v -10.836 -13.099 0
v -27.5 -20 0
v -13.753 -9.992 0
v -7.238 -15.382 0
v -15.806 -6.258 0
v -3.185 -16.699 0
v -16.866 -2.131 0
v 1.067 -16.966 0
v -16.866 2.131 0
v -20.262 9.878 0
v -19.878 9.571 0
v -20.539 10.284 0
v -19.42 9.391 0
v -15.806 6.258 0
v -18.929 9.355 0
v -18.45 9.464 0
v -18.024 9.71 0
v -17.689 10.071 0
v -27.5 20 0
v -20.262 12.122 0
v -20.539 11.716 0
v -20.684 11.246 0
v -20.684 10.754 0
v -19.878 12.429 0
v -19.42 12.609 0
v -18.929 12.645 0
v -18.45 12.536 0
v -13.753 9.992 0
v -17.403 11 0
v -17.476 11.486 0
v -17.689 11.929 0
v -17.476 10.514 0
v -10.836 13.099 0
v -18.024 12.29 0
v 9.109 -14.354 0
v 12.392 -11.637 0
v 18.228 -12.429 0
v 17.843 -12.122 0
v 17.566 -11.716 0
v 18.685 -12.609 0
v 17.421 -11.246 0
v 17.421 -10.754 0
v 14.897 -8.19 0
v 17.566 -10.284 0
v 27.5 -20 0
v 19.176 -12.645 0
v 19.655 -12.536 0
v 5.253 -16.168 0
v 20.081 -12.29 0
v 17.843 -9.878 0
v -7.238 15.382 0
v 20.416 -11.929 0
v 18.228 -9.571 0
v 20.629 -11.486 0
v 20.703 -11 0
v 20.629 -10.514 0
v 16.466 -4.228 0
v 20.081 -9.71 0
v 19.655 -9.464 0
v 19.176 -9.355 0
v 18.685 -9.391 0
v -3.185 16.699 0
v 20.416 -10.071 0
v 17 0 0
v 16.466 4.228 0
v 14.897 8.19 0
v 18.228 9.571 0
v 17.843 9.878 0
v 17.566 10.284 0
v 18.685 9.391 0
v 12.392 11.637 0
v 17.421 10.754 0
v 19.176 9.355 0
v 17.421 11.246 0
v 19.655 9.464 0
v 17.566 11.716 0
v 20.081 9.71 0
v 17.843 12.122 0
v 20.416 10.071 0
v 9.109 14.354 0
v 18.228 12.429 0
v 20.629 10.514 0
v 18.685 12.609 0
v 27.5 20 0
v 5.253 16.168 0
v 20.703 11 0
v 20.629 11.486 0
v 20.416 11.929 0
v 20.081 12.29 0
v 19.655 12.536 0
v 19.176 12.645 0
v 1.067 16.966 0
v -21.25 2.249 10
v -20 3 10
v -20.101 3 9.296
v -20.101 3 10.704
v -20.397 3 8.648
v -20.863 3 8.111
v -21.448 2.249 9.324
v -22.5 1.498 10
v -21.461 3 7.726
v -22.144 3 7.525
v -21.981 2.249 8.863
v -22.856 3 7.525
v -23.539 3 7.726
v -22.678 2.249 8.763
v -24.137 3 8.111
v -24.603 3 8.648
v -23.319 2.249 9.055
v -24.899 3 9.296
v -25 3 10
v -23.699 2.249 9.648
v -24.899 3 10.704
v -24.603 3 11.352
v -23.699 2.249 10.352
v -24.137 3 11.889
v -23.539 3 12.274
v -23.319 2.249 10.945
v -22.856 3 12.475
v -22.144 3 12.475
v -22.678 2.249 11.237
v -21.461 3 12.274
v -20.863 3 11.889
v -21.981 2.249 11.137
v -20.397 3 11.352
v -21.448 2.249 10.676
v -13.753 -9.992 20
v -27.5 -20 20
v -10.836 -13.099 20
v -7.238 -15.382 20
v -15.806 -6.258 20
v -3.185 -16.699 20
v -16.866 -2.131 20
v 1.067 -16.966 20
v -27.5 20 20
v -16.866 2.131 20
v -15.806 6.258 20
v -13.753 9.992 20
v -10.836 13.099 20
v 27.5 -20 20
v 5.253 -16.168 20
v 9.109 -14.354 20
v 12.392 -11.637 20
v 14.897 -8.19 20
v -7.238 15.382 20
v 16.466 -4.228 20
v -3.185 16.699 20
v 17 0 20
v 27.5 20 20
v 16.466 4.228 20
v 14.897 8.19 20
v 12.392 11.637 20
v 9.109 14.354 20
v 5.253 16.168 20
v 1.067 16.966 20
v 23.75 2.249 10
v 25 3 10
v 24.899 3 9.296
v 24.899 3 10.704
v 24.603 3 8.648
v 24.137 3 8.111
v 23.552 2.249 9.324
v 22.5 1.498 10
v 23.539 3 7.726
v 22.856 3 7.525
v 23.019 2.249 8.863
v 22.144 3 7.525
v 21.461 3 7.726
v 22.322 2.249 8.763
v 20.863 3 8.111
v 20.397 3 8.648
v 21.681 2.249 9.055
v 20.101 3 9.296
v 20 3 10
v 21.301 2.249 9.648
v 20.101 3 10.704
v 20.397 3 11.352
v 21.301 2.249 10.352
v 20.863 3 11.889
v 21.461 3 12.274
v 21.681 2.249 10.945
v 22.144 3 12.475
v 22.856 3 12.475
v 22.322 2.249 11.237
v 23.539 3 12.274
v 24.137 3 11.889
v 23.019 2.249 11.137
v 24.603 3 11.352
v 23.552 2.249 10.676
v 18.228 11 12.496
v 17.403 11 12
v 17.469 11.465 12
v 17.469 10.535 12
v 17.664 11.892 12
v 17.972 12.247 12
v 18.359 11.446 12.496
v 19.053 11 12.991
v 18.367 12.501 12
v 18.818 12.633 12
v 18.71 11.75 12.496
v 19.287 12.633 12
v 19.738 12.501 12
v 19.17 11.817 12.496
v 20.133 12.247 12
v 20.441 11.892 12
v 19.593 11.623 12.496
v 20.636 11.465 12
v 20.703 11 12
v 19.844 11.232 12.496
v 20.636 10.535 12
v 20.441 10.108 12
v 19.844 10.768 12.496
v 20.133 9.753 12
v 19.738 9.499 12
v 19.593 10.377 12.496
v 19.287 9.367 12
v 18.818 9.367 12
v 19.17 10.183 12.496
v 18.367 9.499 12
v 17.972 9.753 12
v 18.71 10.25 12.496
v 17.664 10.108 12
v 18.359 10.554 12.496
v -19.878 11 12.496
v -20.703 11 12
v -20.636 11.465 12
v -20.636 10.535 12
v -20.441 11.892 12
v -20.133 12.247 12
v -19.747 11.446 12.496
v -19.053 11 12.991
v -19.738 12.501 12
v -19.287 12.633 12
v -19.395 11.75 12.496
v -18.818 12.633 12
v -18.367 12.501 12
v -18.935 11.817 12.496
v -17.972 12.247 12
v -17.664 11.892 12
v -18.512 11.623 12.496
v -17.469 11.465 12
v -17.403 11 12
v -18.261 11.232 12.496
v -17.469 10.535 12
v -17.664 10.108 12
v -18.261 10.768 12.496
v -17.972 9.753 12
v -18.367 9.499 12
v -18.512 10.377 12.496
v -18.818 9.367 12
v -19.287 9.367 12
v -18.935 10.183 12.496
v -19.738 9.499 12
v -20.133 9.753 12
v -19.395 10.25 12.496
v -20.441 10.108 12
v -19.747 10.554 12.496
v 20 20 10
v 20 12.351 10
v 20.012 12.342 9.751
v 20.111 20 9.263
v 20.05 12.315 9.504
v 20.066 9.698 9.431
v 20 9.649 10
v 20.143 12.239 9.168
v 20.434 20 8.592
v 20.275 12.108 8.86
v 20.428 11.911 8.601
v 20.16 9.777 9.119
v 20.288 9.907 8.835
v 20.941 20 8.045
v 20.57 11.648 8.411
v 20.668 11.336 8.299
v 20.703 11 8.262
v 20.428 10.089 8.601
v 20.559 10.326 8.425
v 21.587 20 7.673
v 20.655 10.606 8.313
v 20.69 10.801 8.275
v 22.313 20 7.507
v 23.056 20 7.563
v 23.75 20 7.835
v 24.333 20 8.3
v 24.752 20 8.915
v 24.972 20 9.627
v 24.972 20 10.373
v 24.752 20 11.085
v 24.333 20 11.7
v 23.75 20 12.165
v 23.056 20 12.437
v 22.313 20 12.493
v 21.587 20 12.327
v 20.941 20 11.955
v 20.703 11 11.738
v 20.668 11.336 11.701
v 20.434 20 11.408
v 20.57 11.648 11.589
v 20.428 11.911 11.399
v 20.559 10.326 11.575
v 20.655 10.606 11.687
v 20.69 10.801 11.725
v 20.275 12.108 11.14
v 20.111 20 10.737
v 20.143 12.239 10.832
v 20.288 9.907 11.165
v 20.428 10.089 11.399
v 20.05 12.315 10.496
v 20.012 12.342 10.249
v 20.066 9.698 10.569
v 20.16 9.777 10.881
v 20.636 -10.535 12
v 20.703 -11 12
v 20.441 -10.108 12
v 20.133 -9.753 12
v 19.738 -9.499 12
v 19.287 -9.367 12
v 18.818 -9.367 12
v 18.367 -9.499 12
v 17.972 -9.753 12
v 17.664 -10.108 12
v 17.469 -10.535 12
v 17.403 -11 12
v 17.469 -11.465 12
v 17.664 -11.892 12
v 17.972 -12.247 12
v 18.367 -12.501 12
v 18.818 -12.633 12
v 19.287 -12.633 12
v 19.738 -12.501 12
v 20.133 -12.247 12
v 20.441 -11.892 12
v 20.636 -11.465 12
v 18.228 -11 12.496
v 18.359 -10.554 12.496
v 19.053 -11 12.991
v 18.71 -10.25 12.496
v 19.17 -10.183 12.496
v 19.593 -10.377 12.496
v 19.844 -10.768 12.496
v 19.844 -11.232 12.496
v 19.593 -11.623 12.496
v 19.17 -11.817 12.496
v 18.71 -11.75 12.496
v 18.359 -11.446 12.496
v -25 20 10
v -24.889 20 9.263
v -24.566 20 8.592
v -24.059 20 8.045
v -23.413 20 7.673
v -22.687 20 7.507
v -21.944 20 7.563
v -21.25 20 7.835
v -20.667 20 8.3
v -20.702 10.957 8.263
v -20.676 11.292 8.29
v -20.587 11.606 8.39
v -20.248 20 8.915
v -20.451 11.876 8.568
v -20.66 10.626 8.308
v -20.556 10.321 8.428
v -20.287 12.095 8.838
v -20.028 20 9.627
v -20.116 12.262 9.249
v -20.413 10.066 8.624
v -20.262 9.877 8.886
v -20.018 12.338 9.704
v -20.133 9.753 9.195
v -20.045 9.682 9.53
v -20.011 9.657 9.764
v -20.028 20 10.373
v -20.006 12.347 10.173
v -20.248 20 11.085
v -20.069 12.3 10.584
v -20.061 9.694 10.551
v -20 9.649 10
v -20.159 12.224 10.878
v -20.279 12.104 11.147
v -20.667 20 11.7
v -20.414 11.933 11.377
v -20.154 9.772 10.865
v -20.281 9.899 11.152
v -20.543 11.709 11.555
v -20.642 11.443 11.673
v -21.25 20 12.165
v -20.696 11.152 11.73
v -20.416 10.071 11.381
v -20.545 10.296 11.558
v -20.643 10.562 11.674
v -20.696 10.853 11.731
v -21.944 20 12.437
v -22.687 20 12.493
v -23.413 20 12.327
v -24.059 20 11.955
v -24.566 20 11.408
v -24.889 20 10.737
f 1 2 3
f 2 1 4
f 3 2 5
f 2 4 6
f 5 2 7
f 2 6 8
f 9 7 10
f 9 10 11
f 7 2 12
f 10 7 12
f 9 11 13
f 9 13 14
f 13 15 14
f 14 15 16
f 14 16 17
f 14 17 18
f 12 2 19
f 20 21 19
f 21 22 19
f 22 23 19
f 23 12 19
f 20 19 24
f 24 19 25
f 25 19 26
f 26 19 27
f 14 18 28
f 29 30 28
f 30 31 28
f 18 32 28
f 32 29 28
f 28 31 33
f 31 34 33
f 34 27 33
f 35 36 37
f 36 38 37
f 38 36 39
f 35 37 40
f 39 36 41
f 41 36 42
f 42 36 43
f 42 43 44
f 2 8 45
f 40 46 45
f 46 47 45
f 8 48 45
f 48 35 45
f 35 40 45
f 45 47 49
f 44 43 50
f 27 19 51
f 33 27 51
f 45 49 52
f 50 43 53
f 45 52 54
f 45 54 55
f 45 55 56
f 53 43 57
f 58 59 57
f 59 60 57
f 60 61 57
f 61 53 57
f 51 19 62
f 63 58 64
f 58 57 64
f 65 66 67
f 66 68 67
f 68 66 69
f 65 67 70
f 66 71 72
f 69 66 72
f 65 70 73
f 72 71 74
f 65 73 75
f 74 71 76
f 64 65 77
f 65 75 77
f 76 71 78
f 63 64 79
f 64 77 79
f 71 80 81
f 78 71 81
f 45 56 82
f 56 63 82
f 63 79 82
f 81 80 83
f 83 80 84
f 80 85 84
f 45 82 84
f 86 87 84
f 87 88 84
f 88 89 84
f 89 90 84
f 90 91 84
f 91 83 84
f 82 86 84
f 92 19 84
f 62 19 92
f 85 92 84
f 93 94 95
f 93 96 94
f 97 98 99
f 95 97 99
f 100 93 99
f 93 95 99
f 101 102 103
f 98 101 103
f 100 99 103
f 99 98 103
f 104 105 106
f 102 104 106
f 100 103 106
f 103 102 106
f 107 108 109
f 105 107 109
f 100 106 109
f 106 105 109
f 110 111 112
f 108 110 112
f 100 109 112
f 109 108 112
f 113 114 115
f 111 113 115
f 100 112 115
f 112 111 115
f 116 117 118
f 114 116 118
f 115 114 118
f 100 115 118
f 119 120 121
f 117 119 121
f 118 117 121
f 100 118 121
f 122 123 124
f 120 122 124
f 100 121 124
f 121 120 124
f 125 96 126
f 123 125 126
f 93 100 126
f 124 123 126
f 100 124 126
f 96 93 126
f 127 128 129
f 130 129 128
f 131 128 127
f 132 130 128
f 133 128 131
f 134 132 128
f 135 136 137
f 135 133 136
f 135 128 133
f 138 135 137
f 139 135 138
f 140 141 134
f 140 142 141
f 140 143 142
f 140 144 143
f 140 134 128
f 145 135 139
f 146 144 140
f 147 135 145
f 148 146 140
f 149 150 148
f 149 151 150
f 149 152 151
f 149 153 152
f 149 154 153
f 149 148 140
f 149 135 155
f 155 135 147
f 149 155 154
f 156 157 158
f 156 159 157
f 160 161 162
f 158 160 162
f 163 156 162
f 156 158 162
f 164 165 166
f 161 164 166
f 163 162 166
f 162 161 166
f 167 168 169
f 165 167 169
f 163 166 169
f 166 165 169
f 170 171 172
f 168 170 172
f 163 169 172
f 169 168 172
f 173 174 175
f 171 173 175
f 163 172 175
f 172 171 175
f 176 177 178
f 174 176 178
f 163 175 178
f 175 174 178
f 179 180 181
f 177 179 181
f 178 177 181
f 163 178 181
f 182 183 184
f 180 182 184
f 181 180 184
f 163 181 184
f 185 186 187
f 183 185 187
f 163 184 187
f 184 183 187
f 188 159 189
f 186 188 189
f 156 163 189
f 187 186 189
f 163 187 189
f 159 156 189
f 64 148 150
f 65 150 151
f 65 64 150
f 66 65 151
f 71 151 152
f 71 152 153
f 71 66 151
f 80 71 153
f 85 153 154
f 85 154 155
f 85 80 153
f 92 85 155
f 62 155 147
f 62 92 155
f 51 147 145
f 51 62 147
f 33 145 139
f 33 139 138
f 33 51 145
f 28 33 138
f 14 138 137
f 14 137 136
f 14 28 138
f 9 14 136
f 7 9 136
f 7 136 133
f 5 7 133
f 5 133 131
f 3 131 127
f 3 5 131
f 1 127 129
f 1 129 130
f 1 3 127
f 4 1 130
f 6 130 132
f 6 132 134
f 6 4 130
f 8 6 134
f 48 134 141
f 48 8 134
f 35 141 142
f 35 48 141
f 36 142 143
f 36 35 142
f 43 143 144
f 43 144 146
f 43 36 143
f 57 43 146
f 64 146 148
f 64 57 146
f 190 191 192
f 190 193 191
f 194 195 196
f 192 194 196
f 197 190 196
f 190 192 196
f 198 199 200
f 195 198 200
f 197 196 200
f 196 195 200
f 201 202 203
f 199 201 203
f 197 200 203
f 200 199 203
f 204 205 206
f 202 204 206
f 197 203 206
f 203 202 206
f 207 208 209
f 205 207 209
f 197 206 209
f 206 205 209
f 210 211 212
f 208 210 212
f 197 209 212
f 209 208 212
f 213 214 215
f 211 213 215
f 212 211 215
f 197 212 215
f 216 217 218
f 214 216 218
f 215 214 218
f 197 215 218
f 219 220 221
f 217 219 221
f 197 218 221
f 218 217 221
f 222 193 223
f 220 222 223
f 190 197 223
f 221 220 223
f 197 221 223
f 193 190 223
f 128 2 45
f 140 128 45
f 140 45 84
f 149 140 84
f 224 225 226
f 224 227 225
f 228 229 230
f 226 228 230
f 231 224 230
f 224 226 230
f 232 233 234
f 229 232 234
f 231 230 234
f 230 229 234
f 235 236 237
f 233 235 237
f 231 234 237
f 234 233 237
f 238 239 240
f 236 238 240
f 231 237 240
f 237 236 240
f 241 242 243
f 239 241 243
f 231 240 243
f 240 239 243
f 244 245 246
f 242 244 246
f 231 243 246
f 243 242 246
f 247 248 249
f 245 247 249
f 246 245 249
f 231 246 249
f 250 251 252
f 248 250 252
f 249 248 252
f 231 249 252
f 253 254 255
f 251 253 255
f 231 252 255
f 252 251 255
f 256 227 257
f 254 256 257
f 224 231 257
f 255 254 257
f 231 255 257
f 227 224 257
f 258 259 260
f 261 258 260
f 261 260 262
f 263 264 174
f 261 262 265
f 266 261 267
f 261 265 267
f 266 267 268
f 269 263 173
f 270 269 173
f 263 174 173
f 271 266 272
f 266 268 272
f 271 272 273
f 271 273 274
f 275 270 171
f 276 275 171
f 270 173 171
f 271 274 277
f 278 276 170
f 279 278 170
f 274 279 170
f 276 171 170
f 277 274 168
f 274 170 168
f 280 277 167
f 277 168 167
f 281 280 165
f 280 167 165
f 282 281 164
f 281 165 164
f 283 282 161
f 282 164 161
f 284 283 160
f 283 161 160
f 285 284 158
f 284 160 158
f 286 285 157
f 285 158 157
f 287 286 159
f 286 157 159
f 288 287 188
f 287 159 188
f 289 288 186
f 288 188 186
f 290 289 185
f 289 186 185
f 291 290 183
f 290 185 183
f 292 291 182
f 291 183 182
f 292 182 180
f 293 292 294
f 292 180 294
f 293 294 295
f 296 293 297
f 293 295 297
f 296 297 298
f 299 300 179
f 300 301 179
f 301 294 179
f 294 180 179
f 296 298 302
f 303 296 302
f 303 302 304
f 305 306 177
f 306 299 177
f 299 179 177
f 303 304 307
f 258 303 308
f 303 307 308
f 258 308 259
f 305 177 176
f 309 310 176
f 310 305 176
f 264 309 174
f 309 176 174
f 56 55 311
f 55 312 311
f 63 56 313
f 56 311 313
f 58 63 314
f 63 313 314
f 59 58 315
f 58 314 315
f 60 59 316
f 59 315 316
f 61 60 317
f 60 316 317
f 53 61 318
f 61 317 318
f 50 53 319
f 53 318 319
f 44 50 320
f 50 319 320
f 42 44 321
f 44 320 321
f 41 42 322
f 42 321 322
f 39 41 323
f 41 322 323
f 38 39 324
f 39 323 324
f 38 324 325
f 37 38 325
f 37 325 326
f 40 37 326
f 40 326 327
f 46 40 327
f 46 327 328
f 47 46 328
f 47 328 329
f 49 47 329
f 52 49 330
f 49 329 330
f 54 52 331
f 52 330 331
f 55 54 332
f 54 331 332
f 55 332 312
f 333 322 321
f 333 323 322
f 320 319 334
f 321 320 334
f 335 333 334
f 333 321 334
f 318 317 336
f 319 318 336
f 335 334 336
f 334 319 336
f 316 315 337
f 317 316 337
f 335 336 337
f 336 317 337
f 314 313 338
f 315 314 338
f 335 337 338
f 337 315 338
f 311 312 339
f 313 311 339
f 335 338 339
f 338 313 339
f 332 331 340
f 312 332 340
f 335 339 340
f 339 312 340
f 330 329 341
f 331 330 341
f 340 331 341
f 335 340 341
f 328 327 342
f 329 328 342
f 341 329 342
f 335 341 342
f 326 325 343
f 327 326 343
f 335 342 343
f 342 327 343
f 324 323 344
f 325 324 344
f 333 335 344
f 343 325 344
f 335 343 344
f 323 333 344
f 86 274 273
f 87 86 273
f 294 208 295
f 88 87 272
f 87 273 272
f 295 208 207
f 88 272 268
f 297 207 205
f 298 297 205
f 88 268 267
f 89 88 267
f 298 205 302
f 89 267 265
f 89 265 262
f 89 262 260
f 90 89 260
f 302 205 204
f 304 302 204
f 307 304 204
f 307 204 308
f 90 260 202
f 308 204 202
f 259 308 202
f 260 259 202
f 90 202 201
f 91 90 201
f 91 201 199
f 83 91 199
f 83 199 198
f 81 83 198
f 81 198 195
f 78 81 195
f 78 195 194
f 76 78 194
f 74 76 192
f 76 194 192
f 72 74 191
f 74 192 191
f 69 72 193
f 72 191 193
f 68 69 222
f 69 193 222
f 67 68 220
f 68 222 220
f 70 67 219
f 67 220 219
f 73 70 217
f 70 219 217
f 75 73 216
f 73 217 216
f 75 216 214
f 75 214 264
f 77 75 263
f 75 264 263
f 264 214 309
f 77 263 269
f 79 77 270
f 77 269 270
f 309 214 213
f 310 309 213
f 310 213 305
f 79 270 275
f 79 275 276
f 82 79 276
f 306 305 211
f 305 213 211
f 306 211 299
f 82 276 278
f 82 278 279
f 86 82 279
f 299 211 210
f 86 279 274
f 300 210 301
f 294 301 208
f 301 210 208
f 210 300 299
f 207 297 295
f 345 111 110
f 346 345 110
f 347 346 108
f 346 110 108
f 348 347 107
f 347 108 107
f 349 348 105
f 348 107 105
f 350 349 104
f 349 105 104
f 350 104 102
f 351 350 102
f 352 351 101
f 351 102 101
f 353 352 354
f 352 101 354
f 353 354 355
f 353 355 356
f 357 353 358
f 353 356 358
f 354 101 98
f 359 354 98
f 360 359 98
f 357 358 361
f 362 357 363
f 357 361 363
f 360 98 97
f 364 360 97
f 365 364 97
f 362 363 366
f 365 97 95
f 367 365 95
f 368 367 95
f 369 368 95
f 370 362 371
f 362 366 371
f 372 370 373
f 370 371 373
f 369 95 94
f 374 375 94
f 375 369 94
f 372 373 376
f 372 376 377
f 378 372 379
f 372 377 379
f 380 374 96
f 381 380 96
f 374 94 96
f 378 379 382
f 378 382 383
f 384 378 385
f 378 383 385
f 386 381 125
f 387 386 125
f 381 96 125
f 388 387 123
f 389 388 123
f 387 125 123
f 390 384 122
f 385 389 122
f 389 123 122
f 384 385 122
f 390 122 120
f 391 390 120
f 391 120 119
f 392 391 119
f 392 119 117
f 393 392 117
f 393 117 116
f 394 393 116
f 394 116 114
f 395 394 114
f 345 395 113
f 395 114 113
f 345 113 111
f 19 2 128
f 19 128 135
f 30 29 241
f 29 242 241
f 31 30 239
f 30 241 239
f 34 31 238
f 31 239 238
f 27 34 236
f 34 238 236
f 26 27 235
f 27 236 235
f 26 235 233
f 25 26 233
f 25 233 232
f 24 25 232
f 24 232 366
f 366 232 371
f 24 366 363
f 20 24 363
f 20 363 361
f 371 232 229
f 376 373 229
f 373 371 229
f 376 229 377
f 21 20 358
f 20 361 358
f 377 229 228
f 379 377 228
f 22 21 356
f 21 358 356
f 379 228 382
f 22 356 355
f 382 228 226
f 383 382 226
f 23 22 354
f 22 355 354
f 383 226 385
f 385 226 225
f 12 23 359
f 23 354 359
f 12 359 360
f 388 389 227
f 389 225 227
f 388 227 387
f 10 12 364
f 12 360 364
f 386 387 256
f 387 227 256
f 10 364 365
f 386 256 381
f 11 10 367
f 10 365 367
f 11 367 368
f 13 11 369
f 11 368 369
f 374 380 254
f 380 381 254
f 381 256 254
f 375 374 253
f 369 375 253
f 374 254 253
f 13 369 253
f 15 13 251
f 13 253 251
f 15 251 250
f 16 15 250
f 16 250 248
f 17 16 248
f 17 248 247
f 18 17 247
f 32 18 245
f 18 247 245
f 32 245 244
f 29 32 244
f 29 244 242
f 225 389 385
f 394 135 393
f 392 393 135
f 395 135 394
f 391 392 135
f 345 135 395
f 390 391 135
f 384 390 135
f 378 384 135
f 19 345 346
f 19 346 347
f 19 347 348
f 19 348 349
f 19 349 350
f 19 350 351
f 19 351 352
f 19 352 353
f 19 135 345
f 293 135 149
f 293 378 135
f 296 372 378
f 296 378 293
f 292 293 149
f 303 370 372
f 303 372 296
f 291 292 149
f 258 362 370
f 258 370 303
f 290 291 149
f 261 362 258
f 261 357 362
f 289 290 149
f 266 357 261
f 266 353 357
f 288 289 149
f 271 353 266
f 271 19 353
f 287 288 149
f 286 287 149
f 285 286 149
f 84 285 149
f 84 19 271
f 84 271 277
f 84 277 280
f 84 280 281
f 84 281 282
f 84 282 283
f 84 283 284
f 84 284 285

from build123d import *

# Parameters (mm, degrees)
SKETCH1_W                 = 55
SKETCH1_H                 = 40
SKETCH1_R                 = 17
BOSS_EXTRUDE1_DEPTH       = 20
M6_TAPPED_HOLE1_D         = 5
M6_TAPPED_HOLE1_DEPTH     = 17
M6_TAPPED_HOLE1_TIP       = 1.502151548
M4X0_7_TAPPED_HOLE3_D     = 3.3
M4X0_7_TAPPED_HOLE3_DEPTH = 12
M4X0_7_TAPPED_HOLE3_TIP   = 0.991420021


with BuildPart() as part:
    # Sketch1 → Boss-Extrude1 (new body)
    with BuildSketch(Plane.XY):
        Rectangle(SKETCH1_W, SKETCH1_H)
        Circle(SKETCH1_R, mode=Mode.SUBTRACT)
    extrude(amount=BOSS_EXTRUDE1_DEPTH)

    # M6 Tapped Hole1
    with Locations(Plane(origin=(0, 20, 0), x_dir=(1, 0, 0), z_dir=(0, 1, 0))):
        with Locations((-22.5, -10), (22.5, -10)):
            Hole(M6_TAPPED_HOLE1_D / 2, depth=M6_TAPPED_HOLE1_DEPTH)
            with Locations((0, 0, -(M6_TAPPED_HOLE1_DEPTH + M6_TAPPED_HOLE1_TIP / 2))):  # 118° drill point
                Cone(0, M6_TAPPED_HOLE1_D / 2, M6_TAPPED_HOLE1_TIP, mode=Mode.SUBTRACT)

    # M4x0.7 Tapped Hole3
    with Locations(Plane(origin=(-5.289478712, -11.13007226, 0), x_dir=(-1, 0, 0), z_dir=(0, 0, -1))):
        with Locations((-24.342037596, 0.13007226), (-24.342037596, 22.13007226), (-5.289478712, 33.13007226), (13.763080171, 22.13007226)):
            Hole(M4X0_7_TAPPED_HOLE3_D / 2, depth=M4X0_7_TAPPED_HOLE3_DEPTH)
            with Locations((0, 0, -(M4X0_7_TAPPED_HOLE3_DEPTH + M4X0_7_TAPPED_HOLE3_TIP / 2))):  # 118° drill point
                Cone(0, M4X0_7_TAPPED_HOLE3_D / 2, M4X0_7_TAPPED_HOLE3_TIP, mode=Mode.SUBTRACT)


solid = part.part
